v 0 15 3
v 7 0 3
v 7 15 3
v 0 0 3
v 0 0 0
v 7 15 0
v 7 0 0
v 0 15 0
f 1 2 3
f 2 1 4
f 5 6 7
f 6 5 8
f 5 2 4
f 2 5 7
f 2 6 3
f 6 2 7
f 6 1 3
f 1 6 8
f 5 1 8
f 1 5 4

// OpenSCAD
// Generated by SolidPython 1.0.1 on 2020-07-29 00:46:55


cube(size = [7, 15, 3]);
/***********************************************
*********      SolidPython code:      **********
************************************************
 
# import packages: SolidPython
from solid import *
from solid.utils import *
from itertools import chain, combinations, permutations


class Resize:

    def __init__(self, scad_file):
        self.scad_file = scad_file
        #self.scad_file = import_scad(scad_file)
        # cone/cylinder param:
        self.r1 = 0
        self.r2 = 0
        self.h = 0
        # rectangular prism param:
        self.w = 0
        self.l = 0
        # ellipse param:
        self.r = 0

    # import OpenScad code (file name corresponds to shape)


    # classify shape + parameters
    def assign(self, param1, param2, param3):
        if self.scad_file == 'cone.scad':
            self.r1 = param1
            self.r2 = param2
            self.h = param3
        elif self.scad_file == 'cylinder.scad':
            self.r1 = param1
            self.r2 = param2
            self.h = param3
        elif self.scad_file == 'rectangularPrism.scad':
            self.h = param1
            self.l = param2
            self.w = param3
        else:
            self.r = param1
            self.h = param2

    # resize parameters
    def iterate(self):
        x = range(3, 20, 2)
        i = 1
        if self.scad_file == 'cone.scad':
            tempList = list(permutations(x, 2))
            for temp in tempList:
                param1 = temp[0]
                param2 = temp[1]
                filepath = 'produced_scad_files/' + 'cone' + str(param1) + '_' + str(param2) + '_' + '.scad'
                scad_render_to_file(cylinder(h=param1, r1=param2, r2=0), filepath)

        elif self.scad_file == 'cylinder.scad':
            tempList = list(permutations(x, 3))
            for temp in tempList:
                param1 = temp[0]
                param2 = temp[1]
                filepath = 'produced_scad_files/' + 'cylinder' + str(param1) + '_' + str(param2) + '_' + '.scad'
                scad_render_to_file(cylinder(h=param1, r1=param2, r2=param2), filepath)

        elif self.scad_file == 'rectangularPrism.scad':
            tempList = list(permutations(x, 3))
            for temp in tempList:
                param1 = temp[0]
                param2 = temp[1]
                param3 = temp[2]
                filepath = 'produced_scad_files/' + 'rectangularPrism' + str(param1) + '_' + str(param2) + '_' + str(
                    param3) + '.scad'
                scad_render_to_file(cube(size=(param1, param2, param3)), filepath)

        elif self.scad_file == 'ellipse.scad':
            tempList = list(permutations(x, 4))
            for temp in tempList:
                param1 = temp[0]
                param2 = temp[1]
                param3 = temp[2]
                param4 = temp[3]
                filepath = 'produced_scad_files/' + 'ellipse' + str(param1) + '_' + str(param2) + '_' + str(param3) + '_' + str(param4) + '.scad'
                scad_render_to_file(scale([param1, param2, param3])(sphere(r=param4)), filepath)

    def render_to_scadfile(self):
        scad_render_to_file(scad, 'example.scad') 
 
************************************************/
